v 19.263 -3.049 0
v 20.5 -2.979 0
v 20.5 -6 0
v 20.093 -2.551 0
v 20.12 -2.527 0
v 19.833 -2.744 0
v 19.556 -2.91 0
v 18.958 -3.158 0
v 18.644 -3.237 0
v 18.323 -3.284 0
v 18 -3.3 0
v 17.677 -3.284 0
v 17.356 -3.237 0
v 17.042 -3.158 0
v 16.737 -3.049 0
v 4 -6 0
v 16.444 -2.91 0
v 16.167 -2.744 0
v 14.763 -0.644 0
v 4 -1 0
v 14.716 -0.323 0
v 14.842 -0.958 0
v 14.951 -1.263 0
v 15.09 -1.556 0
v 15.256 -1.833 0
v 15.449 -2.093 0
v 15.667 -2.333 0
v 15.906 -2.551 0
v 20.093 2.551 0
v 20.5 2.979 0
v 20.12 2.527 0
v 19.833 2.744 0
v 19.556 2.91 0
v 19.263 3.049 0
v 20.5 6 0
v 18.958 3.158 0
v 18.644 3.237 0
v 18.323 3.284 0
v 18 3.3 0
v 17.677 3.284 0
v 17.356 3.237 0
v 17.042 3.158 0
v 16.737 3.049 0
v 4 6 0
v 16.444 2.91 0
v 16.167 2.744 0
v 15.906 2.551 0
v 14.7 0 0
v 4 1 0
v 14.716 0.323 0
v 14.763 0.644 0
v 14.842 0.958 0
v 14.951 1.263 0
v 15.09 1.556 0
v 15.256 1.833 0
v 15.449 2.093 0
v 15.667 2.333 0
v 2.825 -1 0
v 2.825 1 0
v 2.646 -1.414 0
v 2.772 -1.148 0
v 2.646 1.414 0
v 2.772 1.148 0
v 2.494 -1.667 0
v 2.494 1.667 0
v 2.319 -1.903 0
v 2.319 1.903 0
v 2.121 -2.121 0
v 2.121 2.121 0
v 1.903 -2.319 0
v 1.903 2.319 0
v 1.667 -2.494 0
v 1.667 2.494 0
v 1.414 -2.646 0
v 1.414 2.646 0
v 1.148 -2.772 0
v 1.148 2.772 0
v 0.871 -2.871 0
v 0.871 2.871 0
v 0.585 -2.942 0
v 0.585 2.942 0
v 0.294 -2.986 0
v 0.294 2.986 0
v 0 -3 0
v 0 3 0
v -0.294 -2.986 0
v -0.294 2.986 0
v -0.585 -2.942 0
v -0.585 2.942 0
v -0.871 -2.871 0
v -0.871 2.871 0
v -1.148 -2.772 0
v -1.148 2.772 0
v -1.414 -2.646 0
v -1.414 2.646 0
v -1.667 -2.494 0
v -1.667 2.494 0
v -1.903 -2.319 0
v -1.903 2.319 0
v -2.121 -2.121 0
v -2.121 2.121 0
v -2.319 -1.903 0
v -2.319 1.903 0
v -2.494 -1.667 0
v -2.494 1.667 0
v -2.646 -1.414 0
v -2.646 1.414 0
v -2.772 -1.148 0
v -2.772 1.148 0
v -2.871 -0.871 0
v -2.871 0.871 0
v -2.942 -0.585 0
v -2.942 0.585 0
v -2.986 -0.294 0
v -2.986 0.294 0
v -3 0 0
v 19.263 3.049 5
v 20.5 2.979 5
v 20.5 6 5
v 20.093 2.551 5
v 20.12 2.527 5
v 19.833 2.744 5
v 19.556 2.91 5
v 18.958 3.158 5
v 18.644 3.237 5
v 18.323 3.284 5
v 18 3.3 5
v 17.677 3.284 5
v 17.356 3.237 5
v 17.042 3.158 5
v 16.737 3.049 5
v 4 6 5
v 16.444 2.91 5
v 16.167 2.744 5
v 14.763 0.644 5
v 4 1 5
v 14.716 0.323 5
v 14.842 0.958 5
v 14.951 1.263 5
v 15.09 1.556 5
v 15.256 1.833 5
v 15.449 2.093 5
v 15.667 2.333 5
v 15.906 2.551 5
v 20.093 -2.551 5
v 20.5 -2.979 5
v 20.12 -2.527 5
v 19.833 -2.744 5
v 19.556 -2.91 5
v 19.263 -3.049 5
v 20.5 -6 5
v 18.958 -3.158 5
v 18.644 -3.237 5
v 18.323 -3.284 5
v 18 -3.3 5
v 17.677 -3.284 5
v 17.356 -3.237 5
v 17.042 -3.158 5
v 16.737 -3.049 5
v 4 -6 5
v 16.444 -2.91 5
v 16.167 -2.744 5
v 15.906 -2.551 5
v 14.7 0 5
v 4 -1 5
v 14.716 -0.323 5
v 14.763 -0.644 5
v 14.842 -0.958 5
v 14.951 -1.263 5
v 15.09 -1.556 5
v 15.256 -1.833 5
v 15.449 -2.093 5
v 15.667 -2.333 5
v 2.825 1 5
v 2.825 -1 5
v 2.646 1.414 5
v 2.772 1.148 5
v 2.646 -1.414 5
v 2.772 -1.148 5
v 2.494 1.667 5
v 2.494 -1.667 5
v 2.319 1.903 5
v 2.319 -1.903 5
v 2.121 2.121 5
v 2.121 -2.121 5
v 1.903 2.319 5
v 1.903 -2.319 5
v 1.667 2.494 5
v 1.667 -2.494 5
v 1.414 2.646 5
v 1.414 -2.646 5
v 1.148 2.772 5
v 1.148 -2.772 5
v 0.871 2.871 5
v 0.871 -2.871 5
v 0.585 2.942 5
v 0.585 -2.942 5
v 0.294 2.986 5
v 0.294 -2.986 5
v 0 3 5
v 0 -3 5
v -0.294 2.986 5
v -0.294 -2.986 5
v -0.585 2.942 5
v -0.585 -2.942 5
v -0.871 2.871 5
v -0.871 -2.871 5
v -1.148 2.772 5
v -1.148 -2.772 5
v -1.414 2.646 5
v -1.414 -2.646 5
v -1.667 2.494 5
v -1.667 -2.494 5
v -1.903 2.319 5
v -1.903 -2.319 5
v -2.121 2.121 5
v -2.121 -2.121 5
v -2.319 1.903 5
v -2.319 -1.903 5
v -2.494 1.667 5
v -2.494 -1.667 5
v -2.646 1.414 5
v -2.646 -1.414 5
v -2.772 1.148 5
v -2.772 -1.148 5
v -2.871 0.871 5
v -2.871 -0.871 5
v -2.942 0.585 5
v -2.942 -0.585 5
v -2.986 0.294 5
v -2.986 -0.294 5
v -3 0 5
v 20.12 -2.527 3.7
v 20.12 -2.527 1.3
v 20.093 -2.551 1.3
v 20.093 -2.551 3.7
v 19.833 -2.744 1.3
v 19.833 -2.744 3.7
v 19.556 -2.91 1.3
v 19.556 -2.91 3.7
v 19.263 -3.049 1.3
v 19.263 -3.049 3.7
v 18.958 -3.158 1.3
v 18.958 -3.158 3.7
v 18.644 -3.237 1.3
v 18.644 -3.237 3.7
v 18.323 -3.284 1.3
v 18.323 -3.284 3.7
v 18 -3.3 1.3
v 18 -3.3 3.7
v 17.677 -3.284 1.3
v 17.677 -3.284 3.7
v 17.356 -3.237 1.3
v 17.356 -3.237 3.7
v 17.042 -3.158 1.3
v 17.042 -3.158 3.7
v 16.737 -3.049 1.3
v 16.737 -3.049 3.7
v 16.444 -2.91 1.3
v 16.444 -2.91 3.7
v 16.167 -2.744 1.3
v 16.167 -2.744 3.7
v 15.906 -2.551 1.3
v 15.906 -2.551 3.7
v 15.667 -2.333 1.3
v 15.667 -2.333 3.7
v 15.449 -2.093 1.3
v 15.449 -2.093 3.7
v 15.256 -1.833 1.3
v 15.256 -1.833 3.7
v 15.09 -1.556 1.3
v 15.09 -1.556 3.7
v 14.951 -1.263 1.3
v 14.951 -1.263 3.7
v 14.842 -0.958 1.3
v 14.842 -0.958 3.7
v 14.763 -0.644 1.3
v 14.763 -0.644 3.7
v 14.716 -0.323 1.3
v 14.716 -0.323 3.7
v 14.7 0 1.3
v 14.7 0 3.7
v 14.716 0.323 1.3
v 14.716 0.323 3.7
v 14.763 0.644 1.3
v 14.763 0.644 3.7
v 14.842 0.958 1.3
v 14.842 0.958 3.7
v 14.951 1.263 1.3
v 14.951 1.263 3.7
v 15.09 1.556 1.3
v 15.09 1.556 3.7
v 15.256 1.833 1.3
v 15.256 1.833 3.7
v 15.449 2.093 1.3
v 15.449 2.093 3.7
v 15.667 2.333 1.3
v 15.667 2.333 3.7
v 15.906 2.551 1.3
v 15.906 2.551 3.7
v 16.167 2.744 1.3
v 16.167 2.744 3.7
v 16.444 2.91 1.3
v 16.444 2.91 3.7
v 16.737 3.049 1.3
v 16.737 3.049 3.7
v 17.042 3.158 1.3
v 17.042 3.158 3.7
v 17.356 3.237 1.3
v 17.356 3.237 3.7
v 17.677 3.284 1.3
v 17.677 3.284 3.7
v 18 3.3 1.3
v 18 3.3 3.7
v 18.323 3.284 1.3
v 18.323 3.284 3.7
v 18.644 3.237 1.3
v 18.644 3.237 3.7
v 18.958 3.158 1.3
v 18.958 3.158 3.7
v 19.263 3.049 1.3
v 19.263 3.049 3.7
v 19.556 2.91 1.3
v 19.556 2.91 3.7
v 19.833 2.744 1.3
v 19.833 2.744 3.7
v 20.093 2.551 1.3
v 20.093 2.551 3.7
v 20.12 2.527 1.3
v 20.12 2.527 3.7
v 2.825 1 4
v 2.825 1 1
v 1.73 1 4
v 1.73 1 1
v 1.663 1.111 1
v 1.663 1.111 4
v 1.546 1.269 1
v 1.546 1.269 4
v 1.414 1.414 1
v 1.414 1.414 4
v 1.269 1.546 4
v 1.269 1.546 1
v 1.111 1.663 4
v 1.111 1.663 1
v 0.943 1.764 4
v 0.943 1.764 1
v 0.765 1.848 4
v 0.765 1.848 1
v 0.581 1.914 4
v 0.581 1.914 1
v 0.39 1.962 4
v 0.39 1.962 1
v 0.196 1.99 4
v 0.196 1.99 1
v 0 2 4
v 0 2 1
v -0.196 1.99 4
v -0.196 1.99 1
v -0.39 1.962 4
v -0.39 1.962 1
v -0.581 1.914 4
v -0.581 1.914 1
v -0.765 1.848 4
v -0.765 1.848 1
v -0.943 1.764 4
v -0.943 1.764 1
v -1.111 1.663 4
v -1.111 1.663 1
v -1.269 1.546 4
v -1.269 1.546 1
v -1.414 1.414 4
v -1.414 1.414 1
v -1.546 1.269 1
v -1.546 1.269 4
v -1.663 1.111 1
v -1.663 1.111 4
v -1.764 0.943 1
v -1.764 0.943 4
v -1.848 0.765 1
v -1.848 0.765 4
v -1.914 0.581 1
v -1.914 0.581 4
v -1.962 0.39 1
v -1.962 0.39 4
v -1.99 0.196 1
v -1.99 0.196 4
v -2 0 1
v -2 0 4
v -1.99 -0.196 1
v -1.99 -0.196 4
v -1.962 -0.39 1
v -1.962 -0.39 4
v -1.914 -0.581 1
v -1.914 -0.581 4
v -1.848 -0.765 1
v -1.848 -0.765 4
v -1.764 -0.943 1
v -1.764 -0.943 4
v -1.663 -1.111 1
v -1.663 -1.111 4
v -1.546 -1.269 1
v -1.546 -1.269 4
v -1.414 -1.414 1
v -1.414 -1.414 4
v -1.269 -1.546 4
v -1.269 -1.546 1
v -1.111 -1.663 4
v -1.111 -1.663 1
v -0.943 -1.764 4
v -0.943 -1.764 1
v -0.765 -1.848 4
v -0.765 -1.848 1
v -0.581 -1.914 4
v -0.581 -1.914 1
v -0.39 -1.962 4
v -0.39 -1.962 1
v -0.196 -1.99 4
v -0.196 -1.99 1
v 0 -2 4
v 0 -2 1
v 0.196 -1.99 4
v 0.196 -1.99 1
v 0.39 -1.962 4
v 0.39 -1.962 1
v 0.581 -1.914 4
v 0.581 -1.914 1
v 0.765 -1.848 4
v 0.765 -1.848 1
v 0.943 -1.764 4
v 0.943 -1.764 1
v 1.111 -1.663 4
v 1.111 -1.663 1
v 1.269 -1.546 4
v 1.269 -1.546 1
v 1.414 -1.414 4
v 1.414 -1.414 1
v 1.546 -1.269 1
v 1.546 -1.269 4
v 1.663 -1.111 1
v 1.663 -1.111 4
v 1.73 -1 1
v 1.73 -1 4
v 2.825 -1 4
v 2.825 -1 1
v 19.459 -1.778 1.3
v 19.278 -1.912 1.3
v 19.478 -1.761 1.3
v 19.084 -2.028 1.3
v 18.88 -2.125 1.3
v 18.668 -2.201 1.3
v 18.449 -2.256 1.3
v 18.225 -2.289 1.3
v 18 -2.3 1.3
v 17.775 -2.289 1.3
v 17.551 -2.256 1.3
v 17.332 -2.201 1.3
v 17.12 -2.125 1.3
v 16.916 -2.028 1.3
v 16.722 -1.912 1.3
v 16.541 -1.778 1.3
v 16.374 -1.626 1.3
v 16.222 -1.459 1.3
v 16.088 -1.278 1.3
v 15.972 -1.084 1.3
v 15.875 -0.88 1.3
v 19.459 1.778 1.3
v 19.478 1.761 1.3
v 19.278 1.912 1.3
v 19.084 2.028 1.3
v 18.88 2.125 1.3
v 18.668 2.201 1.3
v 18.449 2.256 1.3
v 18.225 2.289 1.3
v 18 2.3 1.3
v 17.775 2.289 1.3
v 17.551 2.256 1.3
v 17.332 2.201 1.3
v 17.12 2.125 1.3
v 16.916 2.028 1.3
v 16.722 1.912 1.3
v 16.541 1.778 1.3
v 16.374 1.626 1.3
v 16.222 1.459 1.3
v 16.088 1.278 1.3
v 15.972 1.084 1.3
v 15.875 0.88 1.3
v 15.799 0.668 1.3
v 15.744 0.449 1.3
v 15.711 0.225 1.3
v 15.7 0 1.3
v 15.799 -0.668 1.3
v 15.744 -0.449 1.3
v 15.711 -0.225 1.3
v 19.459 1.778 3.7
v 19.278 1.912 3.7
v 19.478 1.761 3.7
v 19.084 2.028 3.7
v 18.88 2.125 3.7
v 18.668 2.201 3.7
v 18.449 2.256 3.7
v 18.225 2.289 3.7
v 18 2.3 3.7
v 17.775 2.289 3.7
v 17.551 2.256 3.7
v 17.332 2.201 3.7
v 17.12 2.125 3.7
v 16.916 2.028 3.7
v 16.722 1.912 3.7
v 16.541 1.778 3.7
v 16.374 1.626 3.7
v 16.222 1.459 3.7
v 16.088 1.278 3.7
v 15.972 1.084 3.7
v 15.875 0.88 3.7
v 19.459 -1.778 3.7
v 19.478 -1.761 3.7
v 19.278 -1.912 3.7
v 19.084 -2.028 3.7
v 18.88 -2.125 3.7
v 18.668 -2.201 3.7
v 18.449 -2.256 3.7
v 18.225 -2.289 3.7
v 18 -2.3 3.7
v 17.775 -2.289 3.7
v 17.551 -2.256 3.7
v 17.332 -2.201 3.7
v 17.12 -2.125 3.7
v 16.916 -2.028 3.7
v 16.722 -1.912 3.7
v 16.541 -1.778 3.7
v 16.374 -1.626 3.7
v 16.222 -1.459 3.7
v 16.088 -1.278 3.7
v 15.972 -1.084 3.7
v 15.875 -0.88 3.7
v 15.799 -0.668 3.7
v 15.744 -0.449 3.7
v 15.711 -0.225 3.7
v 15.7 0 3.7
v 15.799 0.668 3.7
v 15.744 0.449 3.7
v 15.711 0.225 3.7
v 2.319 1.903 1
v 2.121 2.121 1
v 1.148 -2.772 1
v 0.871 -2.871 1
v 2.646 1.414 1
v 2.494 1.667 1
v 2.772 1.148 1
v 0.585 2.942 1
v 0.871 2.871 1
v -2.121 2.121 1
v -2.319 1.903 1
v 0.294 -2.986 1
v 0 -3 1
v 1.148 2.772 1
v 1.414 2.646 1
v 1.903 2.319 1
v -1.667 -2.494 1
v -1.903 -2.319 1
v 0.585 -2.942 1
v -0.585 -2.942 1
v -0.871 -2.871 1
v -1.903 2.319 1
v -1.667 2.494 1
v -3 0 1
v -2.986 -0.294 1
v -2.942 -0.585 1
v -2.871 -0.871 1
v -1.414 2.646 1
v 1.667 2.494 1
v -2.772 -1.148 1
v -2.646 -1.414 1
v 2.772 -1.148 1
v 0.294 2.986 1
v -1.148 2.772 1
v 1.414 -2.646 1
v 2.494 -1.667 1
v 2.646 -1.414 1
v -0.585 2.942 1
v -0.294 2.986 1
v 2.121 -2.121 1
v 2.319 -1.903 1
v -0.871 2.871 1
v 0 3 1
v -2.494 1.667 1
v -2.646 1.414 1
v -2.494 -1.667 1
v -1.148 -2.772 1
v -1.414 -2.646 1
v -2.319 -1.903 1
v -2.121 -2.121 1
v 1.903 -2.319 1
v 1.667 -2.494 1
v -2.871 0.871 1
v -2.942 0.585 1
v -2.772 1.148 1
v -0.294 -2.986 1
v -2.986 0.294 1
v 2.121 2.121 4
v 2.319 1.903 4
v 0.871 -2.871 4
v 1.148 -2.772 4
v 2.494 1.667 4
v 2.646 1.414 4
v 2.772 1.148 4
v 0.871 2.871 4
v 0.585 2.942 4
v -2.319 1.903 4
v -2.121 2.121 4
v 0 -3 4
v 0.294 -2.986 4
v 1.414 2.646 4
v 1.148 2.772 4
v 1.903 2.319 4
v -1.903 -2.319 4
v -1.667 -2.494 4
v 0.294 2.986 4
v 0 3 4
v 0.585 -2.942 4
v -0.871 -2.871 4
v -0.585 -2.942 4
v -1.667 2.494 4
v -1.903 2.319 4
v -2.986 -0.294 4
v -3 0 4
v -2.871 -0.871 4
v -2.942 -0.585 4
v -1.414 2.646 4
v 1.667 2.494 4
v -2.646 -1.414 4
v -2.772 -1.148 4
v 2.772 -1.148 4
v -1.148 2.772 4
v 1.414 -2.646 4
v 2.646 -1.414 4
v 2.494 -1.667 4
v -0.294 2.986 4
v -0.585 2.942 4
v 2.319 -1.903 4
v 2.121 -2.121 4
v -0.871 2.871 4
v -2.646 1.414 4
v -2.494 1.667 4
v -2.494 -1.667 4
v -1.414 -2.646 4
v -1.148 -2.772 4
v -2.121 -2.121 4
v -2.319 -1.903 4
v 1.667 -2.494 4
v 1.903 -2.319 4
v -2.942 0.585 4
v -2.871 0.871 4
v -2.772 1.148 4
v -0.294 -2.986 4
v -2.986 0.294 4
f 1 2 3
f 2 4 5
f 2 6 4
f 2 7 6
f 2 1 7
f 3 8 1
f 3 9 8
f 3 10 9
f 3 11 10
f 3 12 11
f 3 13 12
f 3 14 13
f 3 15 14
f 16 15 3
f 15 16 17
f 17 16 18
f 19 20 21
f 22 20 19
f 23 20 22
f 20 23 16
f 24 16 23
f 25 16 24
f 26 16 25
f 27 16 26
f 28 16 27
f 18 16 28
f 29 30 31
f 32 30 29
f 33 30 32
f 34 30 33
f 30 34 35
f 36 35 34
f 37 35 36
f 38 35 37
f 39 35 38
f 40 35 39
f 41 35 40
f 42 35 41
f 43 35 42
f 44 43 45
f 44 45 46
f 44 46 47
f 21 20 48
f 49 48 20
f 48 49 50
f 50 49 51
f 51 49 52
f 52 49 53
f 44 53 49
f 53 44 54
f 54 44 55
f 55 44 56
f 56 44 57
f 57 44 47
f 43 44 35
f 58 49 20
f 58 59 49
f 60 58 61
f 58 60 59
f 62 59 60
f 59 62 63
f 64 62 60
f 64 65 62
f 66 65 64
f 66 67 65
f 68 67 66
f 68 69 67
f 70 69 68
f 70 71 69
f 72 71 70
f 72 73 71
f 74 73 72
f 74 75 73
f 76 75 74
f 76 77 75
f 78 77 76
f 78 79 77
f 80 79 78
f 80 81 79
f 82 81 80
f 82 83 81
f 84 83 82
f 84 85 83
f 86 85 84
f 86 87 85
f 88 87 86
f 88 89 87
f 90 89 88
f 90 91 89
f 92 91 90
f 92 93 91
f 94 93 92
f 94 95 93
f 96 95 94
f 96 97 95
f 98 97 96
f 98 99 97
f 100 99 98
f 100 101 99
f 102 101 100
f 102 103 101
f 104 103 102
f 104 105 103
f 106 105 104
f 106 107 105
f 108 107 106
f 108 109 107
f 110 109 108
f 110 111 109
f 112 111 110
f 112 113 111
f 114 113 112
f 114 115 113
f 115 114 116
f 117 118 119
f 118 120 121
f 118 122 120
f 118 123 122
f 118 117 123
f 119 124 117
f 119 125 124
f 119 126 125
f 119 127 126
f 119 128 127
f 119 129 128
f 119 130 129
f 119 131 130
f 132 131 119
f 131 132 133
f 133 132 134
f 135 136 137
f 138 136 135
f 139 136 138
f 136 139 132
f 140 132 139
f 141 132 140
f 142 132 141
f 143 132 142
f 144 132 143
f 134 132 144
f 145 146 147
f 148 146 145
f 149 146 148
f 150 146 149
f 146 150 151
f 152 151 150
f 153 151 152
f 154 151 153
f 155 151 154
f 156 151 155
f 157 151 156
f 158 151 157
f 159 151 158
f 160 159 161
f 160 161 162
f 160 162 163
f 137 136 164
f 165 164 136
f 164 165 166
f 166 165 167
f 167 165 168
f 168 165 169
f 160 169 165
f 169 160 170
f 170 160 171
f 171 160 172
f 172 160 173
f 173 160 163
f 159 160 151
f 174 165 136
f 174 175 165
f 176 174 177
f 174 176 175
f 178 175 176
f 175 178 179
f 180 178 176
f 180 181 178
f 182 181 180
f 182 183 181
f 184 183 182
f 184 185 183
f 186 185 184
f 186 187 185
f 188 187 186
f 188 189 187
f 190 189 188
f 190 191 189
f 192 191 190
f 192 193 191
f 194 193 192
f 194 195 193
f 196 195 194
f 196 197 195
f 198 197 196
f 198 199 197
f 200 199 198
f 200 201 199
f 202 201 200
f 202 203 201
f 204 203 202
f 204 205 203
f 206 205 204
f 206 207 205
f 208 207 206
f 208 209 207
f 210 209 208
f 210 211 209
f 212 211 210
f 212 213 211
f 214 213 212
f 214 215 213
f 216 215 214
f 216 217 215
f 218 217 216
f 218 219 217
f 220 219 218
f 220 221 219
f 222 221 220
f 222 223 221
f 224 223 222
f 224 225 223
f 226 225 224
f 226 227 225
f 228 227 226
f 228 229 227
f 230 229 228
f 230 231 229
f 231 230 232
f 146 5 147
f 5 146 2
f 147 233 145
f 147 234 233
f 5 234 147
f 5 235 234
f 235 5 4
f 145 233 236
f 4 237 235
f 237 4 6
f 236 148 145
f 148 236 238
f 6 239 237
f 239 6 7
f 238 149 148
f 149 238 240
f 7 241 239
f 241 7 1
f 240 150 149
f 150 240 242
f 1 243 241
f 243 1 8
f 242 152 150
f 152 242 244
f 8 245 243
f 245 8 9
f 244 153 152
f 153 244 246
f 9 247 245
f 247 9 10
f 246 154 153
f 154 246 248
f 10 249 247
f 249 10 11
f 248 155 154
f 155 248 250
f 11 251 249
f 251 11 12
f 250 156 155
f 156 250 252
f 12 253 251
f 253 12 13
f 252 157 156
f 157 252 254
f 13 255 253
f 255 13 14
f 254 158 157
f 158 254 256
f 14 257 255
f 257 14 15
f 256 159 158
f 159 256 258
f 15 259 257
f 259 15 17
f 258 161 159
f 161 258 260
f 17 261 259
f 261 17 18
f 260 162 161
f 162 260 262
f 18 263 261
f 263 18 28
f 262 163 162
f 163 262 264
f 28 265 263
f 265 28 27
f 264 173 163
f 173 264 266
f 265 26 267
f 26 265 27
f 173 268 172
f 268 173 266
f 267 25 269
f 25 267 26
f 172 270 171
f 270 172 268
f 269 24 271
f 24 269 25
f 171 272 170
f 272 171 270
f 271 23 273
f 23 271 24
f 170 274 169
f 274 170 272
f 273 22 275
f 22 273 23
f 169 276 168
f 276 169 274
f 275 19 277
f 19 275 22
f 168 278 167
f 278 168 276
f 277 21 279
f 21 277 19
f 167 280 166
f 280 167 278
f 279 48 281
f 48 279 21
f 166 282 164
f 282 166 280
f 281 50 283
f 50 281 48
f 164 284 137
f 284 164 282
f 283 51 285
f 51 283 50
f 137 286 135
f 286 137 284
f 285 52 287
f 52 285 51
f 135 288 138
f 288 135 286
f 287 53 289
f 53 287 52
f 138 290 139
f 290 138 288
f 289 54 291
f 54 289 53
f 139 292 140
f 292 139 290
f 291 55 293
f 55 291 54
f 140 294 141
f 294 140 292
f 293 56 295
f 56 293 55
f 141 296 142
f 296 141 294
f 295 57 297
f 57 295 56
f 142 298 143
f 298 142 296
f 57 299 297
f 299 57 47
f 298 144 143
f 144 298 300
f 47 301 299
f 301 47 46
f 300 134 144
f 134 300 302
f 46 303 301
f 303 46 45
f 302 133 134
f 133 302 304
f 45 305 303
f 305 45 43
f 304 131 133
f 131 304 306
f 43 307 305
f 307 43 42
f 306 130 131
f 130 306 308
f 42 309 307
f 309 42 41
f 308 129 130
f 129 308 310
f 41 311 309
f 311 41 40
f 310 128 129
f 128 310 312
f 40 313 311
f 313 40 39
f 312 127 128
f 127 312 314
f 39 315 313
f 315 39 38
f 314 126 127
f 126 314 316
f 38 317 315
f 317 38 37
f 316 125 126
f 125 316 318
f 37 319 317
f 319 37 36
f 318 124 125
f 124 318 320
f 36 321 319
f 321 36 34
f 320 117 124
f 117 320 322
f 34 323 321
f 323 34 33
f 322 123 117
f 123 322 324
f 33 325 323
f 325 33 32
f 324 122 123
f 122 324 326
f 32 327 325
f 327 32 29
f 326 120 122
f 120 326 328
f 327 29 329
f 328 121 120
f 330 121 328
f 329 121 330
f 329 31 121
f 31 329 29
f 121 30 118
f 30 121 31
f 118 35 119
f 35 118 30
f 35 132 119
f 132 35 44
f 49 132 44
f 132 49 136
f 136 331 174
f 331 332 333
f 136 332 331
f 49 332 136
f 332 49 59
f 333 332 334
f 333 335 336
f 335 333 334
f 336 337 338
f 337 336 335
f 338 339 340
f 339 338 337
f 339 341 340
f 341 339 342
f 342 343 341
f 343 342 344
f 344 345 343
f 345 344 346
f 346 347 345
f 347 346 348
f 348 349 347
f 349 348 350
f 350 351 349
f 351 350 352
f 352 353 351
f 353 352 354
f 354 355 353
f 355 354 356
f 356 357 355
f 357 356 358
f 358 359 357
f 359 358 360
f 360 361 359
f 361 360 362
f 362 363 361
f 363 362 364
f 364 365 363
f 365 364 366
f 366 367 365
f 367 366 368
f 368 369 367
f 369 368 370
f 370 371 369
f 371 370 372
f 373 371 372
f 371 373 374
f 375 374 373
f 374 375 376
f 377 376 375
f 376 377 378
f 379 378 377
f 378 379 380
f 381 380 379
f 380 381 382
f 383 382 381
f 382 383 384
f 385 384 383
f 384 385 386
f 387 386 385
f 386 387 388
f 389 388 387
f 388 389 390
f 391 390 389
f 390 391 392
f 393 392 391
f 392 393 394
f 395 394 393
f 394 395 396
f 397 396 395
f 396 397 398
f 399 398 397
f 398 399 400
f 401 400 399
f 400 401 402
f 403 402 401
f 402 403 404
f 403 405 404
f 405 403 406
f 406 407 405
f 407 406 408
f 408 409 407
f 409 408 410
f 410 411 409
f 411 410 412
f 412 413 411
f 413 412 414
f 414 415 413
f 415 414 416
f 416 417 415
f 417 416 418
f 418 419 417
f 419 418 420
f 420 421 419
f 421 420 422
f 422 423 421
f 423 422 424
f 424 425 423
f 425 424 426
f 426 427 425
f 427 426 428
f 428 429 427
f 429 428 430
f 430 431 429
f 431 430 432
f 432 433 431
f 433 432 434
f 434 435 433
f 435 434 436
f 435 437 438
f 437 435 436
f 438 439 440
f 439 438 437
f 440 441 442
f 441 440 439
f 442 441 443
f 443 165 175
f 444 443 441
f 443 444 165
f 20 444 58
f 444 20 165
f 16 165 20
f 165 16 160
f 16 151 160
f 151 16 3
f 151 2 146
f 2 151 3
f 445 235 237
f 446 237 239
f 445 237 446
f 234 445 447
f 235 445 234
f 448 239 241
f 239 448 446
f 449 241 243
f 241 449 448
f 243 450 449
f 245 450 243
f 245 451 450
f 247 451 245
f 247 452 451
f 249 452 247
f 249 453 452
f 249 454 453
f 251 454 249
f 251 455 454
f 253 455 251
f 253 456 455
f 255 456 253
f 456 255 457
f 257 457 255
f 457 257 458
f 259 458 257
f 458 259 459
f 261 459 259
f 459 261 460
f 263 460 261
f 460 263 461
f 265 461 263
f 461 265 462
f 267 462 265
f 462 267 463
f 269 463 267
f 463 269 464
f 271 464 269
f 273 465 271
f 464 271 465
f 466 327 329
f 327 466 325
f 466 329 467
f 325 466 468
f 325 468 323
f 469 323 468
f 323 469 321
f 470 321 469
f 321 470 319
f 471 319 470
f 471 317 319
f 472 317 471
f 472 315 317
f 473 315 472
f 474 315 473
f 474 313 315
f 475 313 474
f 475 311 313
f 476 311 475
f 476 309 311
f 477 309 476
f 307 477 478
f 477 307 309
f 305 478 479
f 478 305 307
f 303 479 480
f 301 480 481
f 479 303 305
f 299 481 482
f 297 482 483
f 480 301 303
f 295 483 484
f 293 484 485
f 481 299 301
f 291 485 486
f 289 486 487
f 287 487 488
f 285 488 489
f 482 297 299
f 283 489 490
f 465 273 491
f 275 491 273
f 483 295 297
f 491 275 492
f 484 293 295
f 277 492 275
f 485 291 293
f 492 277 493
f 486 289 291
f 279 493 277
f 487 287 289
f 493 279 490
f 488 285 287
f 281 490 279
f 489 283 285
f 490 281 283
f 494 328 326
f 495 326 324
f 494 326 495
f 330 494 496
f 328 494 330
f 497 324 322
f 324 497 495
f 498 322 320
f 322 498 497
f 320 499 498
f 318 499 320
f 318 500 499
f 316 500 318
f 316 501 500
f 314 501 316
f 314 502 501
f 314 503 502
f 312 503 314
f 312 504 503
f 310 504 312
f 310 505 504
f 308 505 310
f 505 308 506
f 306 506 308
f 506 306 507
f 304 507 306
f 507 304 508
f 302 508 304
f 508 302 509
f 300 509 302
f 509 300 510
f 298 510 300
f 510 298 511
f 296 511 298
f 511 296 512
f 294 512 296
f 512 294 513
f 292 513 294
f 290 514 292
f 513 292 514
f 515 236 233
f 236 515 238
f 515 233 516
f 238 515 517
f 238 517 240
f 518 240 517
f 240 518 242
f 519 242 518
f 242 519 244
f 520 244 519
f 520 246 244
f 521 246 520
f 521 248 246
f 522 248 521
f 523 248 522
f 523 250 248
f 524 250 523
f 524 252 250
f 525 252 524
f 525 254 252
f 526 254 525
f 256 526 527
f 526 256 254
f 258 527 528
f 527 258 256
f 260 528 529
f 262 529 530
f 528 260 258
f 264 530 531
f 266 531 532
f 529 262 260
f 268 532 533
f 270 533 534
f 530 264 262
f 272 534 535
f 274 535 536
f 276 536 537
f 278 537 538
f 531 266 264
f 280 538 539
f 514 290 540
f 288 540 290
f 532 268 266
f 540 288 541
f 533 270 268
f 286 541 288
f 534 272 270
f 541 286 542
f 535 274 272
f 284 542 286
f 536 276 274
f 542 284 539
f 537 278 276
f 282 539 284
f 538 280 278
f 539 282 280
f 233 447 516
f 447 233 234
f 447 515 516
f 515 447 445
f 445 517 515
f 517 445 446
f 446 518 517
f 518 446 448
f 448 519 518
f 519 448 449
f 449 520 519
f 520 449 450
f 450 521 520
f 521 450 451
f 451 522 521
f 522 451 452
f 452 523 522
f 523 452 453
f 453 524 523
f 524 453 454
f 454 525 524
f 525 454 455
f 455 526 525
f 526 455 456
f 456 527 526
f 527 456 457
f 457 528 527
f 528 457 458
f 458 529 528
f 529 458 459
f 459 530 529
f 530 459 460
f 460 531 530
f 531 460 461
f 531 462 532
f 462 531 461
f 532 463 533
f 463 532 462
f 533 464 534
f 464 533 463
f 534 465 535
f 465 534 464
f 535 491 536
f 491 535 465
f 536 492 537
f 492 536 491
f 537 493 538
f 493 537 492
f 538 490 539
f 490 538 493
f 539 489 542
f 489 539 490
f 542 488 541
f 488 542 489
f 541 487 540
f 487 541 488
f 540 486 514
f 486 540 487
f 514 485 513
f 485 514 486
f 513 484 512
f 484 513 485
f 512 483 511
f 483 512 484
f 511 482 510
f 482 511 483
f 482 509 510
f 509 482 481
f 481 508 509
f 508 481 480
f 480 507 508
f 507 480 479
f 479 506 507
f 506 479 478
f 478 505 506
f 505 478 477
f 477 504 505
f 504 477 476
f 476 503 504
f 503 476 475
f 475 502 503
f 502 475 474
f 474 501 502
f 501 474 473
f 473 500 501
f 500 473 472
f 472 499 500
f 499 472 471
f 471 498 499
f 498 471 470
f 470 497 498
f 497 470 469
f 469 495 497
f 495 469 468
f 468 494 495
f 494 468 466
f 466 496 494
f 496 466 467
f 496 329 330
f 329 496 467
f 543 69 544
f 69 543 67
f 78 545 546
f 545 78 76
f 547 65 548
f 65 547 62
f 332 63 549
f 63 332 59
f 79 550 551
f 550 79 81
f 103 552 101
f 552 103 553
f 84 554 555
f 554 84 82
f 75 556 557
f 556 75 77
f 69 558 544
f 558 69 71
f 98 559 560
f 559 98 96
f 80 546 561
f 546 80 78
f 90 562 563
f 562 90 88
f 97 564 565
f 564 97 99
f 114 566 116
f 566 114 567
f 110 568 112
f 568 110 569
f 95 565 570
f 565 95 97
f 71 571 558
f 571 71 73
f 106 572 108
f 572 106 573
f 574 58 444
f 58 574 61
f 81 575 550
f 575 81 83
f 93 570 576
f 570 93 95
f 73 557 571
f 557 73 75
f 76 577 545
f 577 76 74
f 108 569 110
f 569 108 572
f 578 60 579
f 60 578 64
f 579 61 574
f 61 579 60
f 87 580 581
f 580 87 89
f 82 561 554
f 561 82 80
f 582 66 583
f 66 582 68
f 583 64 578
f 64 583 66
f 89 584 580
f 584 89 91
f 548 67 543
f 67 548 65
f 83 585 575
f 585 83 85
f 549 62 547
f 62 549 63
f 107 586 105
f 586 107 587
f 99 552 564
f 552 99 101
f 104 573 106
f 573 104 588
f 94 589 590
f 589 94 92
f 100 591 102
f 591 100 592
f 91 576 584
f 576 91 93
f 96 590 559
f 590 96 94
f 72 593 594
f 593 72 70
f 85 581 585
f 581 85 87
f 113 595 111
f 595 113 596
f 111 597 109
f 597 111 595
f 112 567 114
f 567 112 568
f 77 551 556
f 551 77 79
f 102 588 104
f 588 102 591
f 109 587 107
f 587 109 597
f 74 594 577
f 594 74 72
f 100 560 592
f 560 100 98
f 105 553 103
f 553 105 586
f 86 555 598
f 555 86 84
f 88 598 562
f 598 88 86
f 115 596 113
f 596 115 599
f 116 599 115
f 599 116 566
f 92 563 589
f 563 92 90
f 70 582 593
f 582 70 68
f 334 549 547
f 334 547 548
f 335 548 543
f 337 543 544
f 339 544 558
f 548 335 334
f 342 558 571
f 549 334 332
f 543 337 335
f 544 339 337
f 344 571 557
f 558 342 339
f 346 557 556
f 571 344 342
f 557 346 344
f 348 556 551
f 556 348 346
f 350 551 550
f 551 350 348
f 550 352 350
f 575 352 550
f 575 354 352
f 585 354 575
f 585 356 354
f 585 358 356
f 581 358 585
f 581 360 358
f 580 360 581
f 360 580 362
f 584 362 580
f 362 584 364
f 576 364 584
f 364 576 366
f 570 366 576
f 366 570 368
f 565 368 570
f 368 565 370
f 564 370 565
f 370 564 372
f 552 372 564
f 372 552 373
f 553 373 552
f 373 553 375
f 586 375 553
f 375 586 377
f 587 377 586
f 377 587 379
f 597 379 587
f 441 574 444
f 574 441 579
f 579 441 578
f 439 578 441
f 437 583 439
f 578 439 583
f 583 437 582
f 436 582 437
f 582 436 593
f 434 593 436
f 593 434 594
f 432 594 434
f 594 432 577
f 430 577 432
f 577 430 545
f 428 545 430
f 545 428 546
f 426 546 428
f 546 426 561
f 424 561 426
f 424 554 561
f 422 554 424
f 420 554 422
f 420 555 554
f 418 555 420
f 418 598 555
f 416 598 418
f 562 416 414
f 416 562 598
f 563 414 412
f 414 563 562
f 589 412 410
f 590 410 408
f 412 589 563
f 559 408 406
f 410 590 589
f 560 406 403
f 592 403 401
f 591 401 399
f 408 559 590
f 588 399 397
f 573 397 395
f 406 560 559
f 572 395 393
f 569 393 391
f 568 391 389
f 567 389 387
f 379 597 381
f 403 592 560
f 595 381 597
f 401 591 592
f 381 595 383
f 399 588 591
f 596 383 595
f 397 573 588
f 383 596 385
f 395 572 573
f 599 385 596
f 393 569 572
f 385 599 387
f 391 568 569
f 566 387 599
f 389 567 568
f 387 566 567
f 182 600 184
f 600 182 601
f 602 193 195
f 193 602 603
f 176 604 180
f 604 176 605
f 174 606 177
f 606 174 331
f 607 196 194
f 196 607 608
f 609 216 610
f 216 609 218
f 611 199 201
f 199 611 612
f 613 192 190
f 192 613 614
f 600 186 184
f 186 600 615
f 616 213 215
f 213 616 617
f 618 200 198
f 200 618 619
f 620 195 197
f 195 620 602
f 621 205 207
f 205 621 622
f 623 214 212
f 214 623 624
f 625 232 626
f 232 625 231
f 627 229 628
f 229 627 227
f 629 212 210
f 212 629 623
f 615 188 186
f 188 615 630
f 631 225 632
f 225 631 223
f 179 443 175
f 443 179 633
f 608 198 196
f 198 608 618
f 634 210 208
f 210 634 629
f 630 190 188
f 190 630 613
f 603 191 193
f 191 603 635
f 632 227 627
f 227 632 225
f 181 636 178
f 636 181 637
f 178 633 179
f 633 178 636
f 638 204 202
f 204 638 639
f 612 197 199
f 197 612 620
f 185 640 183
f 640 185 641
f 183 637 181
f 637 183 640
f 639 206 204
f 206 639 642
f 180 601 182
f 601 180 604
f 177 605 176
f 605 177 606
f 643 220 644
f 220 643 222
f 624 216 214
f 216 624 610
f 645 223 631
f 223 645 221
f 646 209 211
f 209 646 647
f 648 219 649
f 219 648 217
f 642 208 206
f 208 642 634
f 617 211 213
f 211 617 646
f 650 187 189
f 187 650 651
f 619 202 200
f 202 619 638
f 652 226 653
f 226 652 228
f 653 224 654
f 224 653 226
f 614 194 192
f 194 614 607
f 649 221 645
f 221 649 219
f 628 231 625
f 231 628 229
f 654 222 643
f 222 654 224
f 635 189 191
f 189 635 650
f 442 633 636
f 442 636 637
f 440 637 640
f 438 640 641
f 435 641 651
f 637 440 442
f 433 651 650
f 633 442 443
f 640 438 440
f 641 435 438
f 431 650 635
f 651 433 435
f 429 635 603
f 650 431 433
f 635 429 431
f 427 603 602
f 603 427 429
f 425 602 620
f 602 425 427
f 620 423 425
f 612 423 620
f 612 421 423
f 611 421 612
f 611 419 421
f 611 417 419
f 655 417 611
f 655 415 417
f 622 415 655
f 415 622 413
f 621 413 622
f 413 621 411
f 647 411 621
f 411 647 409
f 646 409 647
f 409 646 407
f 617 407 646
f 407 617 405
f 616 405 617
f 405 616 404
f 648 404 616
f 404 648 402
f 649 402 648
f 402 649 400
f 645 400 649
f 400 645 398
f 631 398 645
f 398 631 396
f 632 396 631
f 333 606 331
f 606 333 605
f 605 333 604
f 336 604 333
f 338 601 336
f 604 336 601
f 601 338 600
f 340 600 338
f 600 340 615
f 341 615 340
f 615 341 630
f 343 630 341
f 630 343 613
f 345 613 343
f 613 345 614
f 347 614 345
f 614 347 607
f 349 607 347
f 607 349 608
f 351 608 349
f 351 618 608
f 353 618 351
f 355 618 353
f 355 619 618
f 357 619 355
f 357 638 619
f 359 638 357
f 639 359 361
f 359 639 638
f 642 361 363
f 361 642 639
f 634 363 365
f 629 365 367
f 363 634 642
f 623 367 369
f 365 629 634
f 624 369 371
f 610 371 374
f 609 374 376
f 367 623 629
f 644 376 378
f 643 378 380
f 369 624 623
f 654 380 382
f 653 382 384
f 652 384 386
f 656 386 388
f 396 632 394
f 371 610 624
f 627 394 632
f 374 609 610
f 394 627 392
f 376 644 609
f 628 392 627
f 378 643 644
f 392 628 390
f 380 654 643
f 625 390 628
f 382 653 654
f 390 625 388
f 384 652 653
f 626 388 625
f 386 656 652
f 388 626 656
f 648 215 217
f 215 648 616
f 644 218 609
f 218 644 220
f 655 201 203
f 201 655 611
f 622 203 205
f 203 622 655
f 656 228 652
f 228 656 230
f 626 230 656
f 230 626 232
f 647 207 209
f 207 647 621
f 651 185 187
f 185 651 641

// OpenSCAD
part = "link"; // [link, assembly]
cadverify_only = "";
module instance(name, part, unit = 1) {
    echo(cadverify_instance = [name, part, unit]);
    if (cadverify_only == "" || cadverify_only == name) children();
}

// Parameters (mm)
pitch = 18;          // pin-to-bore distance
link_w = 12;         // width (Y)
link_t = 5;          // thickness (Z)
pin_d = 4;           // pin shaft diameter
bore_d = 4.6;        // bore diameter (0.3 radial clearance)
cap_d = 6;           // cap diameter
cap_h = 1;           // cap thickness
gap_z = 0.3;         // vertical clearance cap<->knuckle
kn_h = 2.4;          // knuckle height = 5-2*1-2*0.3
kn_out_d = 7.6;      // knuckle outer diameter (1.5 wall)
cap_cav_d = 6.6;     // cap cavity diameter (0.3 radial clearance)
neck_w = 2;          // neck width
slot_half = 50;      // slot half-angle (deg), allows +-30 deg swing
yoke_east = 20.5;    // full-height yoke east extent (local X)
$fn = 64;

module link_geom() {
    bore_x = pitch;
    cap_r = cap_d/2;
    cav_r = cap_cav_d/2;
    pin_r = pin_d/2;
    bore_r = bore_d/2;
    kn_out_r = kn_out_d/2;
    // far points for slot wedge (full height + middle)
    // wedge from bore center to the east, half-angle slot_half
    wedge_far = 30;
    dy_far = wedge_far * tan(slot_half);
    // ---- full height (0..5): yoke + neck + pin shaft ----
    linear_extrude(height = link_t, convexity = 8) {
        difference() {
            union() {
                // pin shaft disc
                translate([0,0]) circle(r = pin_r);
                // neck rect X[0,5] Y[-1,1]
                translate([0,-neck_w/2]) square([5, neck_w]);
                // yoke base rect X[4,yoke_east] Y[-6,6]
                translate([4,-link_w/2]) square([yoke_east-4, link_w]);
            }
            // cap cavity (for next link caps)
            translate([bore_x,0]) circle(r = cav_r);
            // slot wedge for next-link neck swing (full height)
            polygon(points = [[bore_x,0],[bore_x+wedge_far, dy_far],[bore_x+wedge_far, -dy_far]]);
        }
    }
    // ---- middle knuckle ring (1.3..3.7) ----
    kn_bot = cap_h + gap_z; // 1.3
    translate([0,0,kn_bot])
    linear_extrude(height = kn_h, convexity = 8) {
        difference() {
            translate([bore_x,0]) circle(r = kn_out_r);
            translate([bore_x,0]) circle(r = bore_r);
            polygon(points = [[bore_x,0],[bore_x+wedge_far, dy_far],[bore_x+wedge_far, -dy_far]]);
        }
    }
    // ---- caps ----
    translate([0,0,0]) cylinder(h = cap_h, r = cap_r);
    translate([0,0,link_t-cap_h]) cylinder(h = cap_h, r = cap_r);
}

if (part == "assembly") {
    instance("link1", "link", 1) translate([0,0,0]) link_geom();
    instance("link2", "link", 1) translate([18,0,0]) link_geom();
    instance("link3", "link", 1) translate([36,0,0]) link_geom();
    echo(cadverify_spec = [
        ["bounds", [[-3, -6, 0], [56.5, 6, 5]]],
        ["support_faces", [["bed", "-z", 200]]],
        ["motions", [
            ["bend", ["link3"], "rotate", [36, 0, 0], [0, 0, 1], [-30, 30]]
        ]],
        ["assembly_order", [
            [["link1", "link2", "link3"], [0, 0, 0]]
        ]],
        ["print_in_place", 0.3],
        ["overhangs_allowed", [
            ["pin cap link1", [[-3, -3, 3.8], [3, 3, 4.2]]],
            ["knuckle joint1", [[14.5, -3.5, 1.0], [21, 3.5, 1.5]]],
            ["pin cap link2", [[15, -3, 3.8], [21, 3, 4.2]]],
            ["knuckle joint2", [[32.5, -3.5, 1.0], [39, 3.5, 1.5]]],
            ["pin cap link3", [[33, -3, 3.8], [39, 3, 4.2]]],
            ["knuckle end", [[50.5, -3.5, 1.0], [57, 3.5, 1.5]]]
        ]],
        ["held", ["link1", "link2", "link3"]]
    ]);
} else {
    link_geom();
    echo(cadverify_spec = [
        ["bounds", [[-3, -6, 0], [20.5, 6, 5]]],
        ["bodies", 1],
        ["through_holes", 0],
        ["support_faces", [["bed", "-z", 100]]],
        ["overhangs_allowed", [
            ["pin cap", [[-3, -3, 3.8], [3, 3, 4.2]]],
            ["knuckle ceiling", [[14.5, -3.5, 1.0], [21, 3.5, 1.5]]]
        ]],
        ["copies", 3],
        ["details", [
            ["body", "material", [[4, -6, 0], [14, 6, 5]], 0.85],
            ["neck", "material", [[0, -1, 0], [5, 1, 5]], 0.8],
            ["knuckle", "material", [[14.2, -3.8, 1.3], [21.8, 3.8, 3.7]], 0.25],
            ["slot", "void", [[19, -1, 0], [21, 1, 5]], 0.8],
            ["cap_cavity", "void", [[14.7, -3.3, 0], [21.3, 3.3, 1]], 0.5],
            ["wall", "thickness", [18, 7, 2.5], [0, -1, 0], 2.7],
            ["floor", "thickness", [9, 0, -1], [0, 0, 1], 5]
        ]]
    ]);
}
